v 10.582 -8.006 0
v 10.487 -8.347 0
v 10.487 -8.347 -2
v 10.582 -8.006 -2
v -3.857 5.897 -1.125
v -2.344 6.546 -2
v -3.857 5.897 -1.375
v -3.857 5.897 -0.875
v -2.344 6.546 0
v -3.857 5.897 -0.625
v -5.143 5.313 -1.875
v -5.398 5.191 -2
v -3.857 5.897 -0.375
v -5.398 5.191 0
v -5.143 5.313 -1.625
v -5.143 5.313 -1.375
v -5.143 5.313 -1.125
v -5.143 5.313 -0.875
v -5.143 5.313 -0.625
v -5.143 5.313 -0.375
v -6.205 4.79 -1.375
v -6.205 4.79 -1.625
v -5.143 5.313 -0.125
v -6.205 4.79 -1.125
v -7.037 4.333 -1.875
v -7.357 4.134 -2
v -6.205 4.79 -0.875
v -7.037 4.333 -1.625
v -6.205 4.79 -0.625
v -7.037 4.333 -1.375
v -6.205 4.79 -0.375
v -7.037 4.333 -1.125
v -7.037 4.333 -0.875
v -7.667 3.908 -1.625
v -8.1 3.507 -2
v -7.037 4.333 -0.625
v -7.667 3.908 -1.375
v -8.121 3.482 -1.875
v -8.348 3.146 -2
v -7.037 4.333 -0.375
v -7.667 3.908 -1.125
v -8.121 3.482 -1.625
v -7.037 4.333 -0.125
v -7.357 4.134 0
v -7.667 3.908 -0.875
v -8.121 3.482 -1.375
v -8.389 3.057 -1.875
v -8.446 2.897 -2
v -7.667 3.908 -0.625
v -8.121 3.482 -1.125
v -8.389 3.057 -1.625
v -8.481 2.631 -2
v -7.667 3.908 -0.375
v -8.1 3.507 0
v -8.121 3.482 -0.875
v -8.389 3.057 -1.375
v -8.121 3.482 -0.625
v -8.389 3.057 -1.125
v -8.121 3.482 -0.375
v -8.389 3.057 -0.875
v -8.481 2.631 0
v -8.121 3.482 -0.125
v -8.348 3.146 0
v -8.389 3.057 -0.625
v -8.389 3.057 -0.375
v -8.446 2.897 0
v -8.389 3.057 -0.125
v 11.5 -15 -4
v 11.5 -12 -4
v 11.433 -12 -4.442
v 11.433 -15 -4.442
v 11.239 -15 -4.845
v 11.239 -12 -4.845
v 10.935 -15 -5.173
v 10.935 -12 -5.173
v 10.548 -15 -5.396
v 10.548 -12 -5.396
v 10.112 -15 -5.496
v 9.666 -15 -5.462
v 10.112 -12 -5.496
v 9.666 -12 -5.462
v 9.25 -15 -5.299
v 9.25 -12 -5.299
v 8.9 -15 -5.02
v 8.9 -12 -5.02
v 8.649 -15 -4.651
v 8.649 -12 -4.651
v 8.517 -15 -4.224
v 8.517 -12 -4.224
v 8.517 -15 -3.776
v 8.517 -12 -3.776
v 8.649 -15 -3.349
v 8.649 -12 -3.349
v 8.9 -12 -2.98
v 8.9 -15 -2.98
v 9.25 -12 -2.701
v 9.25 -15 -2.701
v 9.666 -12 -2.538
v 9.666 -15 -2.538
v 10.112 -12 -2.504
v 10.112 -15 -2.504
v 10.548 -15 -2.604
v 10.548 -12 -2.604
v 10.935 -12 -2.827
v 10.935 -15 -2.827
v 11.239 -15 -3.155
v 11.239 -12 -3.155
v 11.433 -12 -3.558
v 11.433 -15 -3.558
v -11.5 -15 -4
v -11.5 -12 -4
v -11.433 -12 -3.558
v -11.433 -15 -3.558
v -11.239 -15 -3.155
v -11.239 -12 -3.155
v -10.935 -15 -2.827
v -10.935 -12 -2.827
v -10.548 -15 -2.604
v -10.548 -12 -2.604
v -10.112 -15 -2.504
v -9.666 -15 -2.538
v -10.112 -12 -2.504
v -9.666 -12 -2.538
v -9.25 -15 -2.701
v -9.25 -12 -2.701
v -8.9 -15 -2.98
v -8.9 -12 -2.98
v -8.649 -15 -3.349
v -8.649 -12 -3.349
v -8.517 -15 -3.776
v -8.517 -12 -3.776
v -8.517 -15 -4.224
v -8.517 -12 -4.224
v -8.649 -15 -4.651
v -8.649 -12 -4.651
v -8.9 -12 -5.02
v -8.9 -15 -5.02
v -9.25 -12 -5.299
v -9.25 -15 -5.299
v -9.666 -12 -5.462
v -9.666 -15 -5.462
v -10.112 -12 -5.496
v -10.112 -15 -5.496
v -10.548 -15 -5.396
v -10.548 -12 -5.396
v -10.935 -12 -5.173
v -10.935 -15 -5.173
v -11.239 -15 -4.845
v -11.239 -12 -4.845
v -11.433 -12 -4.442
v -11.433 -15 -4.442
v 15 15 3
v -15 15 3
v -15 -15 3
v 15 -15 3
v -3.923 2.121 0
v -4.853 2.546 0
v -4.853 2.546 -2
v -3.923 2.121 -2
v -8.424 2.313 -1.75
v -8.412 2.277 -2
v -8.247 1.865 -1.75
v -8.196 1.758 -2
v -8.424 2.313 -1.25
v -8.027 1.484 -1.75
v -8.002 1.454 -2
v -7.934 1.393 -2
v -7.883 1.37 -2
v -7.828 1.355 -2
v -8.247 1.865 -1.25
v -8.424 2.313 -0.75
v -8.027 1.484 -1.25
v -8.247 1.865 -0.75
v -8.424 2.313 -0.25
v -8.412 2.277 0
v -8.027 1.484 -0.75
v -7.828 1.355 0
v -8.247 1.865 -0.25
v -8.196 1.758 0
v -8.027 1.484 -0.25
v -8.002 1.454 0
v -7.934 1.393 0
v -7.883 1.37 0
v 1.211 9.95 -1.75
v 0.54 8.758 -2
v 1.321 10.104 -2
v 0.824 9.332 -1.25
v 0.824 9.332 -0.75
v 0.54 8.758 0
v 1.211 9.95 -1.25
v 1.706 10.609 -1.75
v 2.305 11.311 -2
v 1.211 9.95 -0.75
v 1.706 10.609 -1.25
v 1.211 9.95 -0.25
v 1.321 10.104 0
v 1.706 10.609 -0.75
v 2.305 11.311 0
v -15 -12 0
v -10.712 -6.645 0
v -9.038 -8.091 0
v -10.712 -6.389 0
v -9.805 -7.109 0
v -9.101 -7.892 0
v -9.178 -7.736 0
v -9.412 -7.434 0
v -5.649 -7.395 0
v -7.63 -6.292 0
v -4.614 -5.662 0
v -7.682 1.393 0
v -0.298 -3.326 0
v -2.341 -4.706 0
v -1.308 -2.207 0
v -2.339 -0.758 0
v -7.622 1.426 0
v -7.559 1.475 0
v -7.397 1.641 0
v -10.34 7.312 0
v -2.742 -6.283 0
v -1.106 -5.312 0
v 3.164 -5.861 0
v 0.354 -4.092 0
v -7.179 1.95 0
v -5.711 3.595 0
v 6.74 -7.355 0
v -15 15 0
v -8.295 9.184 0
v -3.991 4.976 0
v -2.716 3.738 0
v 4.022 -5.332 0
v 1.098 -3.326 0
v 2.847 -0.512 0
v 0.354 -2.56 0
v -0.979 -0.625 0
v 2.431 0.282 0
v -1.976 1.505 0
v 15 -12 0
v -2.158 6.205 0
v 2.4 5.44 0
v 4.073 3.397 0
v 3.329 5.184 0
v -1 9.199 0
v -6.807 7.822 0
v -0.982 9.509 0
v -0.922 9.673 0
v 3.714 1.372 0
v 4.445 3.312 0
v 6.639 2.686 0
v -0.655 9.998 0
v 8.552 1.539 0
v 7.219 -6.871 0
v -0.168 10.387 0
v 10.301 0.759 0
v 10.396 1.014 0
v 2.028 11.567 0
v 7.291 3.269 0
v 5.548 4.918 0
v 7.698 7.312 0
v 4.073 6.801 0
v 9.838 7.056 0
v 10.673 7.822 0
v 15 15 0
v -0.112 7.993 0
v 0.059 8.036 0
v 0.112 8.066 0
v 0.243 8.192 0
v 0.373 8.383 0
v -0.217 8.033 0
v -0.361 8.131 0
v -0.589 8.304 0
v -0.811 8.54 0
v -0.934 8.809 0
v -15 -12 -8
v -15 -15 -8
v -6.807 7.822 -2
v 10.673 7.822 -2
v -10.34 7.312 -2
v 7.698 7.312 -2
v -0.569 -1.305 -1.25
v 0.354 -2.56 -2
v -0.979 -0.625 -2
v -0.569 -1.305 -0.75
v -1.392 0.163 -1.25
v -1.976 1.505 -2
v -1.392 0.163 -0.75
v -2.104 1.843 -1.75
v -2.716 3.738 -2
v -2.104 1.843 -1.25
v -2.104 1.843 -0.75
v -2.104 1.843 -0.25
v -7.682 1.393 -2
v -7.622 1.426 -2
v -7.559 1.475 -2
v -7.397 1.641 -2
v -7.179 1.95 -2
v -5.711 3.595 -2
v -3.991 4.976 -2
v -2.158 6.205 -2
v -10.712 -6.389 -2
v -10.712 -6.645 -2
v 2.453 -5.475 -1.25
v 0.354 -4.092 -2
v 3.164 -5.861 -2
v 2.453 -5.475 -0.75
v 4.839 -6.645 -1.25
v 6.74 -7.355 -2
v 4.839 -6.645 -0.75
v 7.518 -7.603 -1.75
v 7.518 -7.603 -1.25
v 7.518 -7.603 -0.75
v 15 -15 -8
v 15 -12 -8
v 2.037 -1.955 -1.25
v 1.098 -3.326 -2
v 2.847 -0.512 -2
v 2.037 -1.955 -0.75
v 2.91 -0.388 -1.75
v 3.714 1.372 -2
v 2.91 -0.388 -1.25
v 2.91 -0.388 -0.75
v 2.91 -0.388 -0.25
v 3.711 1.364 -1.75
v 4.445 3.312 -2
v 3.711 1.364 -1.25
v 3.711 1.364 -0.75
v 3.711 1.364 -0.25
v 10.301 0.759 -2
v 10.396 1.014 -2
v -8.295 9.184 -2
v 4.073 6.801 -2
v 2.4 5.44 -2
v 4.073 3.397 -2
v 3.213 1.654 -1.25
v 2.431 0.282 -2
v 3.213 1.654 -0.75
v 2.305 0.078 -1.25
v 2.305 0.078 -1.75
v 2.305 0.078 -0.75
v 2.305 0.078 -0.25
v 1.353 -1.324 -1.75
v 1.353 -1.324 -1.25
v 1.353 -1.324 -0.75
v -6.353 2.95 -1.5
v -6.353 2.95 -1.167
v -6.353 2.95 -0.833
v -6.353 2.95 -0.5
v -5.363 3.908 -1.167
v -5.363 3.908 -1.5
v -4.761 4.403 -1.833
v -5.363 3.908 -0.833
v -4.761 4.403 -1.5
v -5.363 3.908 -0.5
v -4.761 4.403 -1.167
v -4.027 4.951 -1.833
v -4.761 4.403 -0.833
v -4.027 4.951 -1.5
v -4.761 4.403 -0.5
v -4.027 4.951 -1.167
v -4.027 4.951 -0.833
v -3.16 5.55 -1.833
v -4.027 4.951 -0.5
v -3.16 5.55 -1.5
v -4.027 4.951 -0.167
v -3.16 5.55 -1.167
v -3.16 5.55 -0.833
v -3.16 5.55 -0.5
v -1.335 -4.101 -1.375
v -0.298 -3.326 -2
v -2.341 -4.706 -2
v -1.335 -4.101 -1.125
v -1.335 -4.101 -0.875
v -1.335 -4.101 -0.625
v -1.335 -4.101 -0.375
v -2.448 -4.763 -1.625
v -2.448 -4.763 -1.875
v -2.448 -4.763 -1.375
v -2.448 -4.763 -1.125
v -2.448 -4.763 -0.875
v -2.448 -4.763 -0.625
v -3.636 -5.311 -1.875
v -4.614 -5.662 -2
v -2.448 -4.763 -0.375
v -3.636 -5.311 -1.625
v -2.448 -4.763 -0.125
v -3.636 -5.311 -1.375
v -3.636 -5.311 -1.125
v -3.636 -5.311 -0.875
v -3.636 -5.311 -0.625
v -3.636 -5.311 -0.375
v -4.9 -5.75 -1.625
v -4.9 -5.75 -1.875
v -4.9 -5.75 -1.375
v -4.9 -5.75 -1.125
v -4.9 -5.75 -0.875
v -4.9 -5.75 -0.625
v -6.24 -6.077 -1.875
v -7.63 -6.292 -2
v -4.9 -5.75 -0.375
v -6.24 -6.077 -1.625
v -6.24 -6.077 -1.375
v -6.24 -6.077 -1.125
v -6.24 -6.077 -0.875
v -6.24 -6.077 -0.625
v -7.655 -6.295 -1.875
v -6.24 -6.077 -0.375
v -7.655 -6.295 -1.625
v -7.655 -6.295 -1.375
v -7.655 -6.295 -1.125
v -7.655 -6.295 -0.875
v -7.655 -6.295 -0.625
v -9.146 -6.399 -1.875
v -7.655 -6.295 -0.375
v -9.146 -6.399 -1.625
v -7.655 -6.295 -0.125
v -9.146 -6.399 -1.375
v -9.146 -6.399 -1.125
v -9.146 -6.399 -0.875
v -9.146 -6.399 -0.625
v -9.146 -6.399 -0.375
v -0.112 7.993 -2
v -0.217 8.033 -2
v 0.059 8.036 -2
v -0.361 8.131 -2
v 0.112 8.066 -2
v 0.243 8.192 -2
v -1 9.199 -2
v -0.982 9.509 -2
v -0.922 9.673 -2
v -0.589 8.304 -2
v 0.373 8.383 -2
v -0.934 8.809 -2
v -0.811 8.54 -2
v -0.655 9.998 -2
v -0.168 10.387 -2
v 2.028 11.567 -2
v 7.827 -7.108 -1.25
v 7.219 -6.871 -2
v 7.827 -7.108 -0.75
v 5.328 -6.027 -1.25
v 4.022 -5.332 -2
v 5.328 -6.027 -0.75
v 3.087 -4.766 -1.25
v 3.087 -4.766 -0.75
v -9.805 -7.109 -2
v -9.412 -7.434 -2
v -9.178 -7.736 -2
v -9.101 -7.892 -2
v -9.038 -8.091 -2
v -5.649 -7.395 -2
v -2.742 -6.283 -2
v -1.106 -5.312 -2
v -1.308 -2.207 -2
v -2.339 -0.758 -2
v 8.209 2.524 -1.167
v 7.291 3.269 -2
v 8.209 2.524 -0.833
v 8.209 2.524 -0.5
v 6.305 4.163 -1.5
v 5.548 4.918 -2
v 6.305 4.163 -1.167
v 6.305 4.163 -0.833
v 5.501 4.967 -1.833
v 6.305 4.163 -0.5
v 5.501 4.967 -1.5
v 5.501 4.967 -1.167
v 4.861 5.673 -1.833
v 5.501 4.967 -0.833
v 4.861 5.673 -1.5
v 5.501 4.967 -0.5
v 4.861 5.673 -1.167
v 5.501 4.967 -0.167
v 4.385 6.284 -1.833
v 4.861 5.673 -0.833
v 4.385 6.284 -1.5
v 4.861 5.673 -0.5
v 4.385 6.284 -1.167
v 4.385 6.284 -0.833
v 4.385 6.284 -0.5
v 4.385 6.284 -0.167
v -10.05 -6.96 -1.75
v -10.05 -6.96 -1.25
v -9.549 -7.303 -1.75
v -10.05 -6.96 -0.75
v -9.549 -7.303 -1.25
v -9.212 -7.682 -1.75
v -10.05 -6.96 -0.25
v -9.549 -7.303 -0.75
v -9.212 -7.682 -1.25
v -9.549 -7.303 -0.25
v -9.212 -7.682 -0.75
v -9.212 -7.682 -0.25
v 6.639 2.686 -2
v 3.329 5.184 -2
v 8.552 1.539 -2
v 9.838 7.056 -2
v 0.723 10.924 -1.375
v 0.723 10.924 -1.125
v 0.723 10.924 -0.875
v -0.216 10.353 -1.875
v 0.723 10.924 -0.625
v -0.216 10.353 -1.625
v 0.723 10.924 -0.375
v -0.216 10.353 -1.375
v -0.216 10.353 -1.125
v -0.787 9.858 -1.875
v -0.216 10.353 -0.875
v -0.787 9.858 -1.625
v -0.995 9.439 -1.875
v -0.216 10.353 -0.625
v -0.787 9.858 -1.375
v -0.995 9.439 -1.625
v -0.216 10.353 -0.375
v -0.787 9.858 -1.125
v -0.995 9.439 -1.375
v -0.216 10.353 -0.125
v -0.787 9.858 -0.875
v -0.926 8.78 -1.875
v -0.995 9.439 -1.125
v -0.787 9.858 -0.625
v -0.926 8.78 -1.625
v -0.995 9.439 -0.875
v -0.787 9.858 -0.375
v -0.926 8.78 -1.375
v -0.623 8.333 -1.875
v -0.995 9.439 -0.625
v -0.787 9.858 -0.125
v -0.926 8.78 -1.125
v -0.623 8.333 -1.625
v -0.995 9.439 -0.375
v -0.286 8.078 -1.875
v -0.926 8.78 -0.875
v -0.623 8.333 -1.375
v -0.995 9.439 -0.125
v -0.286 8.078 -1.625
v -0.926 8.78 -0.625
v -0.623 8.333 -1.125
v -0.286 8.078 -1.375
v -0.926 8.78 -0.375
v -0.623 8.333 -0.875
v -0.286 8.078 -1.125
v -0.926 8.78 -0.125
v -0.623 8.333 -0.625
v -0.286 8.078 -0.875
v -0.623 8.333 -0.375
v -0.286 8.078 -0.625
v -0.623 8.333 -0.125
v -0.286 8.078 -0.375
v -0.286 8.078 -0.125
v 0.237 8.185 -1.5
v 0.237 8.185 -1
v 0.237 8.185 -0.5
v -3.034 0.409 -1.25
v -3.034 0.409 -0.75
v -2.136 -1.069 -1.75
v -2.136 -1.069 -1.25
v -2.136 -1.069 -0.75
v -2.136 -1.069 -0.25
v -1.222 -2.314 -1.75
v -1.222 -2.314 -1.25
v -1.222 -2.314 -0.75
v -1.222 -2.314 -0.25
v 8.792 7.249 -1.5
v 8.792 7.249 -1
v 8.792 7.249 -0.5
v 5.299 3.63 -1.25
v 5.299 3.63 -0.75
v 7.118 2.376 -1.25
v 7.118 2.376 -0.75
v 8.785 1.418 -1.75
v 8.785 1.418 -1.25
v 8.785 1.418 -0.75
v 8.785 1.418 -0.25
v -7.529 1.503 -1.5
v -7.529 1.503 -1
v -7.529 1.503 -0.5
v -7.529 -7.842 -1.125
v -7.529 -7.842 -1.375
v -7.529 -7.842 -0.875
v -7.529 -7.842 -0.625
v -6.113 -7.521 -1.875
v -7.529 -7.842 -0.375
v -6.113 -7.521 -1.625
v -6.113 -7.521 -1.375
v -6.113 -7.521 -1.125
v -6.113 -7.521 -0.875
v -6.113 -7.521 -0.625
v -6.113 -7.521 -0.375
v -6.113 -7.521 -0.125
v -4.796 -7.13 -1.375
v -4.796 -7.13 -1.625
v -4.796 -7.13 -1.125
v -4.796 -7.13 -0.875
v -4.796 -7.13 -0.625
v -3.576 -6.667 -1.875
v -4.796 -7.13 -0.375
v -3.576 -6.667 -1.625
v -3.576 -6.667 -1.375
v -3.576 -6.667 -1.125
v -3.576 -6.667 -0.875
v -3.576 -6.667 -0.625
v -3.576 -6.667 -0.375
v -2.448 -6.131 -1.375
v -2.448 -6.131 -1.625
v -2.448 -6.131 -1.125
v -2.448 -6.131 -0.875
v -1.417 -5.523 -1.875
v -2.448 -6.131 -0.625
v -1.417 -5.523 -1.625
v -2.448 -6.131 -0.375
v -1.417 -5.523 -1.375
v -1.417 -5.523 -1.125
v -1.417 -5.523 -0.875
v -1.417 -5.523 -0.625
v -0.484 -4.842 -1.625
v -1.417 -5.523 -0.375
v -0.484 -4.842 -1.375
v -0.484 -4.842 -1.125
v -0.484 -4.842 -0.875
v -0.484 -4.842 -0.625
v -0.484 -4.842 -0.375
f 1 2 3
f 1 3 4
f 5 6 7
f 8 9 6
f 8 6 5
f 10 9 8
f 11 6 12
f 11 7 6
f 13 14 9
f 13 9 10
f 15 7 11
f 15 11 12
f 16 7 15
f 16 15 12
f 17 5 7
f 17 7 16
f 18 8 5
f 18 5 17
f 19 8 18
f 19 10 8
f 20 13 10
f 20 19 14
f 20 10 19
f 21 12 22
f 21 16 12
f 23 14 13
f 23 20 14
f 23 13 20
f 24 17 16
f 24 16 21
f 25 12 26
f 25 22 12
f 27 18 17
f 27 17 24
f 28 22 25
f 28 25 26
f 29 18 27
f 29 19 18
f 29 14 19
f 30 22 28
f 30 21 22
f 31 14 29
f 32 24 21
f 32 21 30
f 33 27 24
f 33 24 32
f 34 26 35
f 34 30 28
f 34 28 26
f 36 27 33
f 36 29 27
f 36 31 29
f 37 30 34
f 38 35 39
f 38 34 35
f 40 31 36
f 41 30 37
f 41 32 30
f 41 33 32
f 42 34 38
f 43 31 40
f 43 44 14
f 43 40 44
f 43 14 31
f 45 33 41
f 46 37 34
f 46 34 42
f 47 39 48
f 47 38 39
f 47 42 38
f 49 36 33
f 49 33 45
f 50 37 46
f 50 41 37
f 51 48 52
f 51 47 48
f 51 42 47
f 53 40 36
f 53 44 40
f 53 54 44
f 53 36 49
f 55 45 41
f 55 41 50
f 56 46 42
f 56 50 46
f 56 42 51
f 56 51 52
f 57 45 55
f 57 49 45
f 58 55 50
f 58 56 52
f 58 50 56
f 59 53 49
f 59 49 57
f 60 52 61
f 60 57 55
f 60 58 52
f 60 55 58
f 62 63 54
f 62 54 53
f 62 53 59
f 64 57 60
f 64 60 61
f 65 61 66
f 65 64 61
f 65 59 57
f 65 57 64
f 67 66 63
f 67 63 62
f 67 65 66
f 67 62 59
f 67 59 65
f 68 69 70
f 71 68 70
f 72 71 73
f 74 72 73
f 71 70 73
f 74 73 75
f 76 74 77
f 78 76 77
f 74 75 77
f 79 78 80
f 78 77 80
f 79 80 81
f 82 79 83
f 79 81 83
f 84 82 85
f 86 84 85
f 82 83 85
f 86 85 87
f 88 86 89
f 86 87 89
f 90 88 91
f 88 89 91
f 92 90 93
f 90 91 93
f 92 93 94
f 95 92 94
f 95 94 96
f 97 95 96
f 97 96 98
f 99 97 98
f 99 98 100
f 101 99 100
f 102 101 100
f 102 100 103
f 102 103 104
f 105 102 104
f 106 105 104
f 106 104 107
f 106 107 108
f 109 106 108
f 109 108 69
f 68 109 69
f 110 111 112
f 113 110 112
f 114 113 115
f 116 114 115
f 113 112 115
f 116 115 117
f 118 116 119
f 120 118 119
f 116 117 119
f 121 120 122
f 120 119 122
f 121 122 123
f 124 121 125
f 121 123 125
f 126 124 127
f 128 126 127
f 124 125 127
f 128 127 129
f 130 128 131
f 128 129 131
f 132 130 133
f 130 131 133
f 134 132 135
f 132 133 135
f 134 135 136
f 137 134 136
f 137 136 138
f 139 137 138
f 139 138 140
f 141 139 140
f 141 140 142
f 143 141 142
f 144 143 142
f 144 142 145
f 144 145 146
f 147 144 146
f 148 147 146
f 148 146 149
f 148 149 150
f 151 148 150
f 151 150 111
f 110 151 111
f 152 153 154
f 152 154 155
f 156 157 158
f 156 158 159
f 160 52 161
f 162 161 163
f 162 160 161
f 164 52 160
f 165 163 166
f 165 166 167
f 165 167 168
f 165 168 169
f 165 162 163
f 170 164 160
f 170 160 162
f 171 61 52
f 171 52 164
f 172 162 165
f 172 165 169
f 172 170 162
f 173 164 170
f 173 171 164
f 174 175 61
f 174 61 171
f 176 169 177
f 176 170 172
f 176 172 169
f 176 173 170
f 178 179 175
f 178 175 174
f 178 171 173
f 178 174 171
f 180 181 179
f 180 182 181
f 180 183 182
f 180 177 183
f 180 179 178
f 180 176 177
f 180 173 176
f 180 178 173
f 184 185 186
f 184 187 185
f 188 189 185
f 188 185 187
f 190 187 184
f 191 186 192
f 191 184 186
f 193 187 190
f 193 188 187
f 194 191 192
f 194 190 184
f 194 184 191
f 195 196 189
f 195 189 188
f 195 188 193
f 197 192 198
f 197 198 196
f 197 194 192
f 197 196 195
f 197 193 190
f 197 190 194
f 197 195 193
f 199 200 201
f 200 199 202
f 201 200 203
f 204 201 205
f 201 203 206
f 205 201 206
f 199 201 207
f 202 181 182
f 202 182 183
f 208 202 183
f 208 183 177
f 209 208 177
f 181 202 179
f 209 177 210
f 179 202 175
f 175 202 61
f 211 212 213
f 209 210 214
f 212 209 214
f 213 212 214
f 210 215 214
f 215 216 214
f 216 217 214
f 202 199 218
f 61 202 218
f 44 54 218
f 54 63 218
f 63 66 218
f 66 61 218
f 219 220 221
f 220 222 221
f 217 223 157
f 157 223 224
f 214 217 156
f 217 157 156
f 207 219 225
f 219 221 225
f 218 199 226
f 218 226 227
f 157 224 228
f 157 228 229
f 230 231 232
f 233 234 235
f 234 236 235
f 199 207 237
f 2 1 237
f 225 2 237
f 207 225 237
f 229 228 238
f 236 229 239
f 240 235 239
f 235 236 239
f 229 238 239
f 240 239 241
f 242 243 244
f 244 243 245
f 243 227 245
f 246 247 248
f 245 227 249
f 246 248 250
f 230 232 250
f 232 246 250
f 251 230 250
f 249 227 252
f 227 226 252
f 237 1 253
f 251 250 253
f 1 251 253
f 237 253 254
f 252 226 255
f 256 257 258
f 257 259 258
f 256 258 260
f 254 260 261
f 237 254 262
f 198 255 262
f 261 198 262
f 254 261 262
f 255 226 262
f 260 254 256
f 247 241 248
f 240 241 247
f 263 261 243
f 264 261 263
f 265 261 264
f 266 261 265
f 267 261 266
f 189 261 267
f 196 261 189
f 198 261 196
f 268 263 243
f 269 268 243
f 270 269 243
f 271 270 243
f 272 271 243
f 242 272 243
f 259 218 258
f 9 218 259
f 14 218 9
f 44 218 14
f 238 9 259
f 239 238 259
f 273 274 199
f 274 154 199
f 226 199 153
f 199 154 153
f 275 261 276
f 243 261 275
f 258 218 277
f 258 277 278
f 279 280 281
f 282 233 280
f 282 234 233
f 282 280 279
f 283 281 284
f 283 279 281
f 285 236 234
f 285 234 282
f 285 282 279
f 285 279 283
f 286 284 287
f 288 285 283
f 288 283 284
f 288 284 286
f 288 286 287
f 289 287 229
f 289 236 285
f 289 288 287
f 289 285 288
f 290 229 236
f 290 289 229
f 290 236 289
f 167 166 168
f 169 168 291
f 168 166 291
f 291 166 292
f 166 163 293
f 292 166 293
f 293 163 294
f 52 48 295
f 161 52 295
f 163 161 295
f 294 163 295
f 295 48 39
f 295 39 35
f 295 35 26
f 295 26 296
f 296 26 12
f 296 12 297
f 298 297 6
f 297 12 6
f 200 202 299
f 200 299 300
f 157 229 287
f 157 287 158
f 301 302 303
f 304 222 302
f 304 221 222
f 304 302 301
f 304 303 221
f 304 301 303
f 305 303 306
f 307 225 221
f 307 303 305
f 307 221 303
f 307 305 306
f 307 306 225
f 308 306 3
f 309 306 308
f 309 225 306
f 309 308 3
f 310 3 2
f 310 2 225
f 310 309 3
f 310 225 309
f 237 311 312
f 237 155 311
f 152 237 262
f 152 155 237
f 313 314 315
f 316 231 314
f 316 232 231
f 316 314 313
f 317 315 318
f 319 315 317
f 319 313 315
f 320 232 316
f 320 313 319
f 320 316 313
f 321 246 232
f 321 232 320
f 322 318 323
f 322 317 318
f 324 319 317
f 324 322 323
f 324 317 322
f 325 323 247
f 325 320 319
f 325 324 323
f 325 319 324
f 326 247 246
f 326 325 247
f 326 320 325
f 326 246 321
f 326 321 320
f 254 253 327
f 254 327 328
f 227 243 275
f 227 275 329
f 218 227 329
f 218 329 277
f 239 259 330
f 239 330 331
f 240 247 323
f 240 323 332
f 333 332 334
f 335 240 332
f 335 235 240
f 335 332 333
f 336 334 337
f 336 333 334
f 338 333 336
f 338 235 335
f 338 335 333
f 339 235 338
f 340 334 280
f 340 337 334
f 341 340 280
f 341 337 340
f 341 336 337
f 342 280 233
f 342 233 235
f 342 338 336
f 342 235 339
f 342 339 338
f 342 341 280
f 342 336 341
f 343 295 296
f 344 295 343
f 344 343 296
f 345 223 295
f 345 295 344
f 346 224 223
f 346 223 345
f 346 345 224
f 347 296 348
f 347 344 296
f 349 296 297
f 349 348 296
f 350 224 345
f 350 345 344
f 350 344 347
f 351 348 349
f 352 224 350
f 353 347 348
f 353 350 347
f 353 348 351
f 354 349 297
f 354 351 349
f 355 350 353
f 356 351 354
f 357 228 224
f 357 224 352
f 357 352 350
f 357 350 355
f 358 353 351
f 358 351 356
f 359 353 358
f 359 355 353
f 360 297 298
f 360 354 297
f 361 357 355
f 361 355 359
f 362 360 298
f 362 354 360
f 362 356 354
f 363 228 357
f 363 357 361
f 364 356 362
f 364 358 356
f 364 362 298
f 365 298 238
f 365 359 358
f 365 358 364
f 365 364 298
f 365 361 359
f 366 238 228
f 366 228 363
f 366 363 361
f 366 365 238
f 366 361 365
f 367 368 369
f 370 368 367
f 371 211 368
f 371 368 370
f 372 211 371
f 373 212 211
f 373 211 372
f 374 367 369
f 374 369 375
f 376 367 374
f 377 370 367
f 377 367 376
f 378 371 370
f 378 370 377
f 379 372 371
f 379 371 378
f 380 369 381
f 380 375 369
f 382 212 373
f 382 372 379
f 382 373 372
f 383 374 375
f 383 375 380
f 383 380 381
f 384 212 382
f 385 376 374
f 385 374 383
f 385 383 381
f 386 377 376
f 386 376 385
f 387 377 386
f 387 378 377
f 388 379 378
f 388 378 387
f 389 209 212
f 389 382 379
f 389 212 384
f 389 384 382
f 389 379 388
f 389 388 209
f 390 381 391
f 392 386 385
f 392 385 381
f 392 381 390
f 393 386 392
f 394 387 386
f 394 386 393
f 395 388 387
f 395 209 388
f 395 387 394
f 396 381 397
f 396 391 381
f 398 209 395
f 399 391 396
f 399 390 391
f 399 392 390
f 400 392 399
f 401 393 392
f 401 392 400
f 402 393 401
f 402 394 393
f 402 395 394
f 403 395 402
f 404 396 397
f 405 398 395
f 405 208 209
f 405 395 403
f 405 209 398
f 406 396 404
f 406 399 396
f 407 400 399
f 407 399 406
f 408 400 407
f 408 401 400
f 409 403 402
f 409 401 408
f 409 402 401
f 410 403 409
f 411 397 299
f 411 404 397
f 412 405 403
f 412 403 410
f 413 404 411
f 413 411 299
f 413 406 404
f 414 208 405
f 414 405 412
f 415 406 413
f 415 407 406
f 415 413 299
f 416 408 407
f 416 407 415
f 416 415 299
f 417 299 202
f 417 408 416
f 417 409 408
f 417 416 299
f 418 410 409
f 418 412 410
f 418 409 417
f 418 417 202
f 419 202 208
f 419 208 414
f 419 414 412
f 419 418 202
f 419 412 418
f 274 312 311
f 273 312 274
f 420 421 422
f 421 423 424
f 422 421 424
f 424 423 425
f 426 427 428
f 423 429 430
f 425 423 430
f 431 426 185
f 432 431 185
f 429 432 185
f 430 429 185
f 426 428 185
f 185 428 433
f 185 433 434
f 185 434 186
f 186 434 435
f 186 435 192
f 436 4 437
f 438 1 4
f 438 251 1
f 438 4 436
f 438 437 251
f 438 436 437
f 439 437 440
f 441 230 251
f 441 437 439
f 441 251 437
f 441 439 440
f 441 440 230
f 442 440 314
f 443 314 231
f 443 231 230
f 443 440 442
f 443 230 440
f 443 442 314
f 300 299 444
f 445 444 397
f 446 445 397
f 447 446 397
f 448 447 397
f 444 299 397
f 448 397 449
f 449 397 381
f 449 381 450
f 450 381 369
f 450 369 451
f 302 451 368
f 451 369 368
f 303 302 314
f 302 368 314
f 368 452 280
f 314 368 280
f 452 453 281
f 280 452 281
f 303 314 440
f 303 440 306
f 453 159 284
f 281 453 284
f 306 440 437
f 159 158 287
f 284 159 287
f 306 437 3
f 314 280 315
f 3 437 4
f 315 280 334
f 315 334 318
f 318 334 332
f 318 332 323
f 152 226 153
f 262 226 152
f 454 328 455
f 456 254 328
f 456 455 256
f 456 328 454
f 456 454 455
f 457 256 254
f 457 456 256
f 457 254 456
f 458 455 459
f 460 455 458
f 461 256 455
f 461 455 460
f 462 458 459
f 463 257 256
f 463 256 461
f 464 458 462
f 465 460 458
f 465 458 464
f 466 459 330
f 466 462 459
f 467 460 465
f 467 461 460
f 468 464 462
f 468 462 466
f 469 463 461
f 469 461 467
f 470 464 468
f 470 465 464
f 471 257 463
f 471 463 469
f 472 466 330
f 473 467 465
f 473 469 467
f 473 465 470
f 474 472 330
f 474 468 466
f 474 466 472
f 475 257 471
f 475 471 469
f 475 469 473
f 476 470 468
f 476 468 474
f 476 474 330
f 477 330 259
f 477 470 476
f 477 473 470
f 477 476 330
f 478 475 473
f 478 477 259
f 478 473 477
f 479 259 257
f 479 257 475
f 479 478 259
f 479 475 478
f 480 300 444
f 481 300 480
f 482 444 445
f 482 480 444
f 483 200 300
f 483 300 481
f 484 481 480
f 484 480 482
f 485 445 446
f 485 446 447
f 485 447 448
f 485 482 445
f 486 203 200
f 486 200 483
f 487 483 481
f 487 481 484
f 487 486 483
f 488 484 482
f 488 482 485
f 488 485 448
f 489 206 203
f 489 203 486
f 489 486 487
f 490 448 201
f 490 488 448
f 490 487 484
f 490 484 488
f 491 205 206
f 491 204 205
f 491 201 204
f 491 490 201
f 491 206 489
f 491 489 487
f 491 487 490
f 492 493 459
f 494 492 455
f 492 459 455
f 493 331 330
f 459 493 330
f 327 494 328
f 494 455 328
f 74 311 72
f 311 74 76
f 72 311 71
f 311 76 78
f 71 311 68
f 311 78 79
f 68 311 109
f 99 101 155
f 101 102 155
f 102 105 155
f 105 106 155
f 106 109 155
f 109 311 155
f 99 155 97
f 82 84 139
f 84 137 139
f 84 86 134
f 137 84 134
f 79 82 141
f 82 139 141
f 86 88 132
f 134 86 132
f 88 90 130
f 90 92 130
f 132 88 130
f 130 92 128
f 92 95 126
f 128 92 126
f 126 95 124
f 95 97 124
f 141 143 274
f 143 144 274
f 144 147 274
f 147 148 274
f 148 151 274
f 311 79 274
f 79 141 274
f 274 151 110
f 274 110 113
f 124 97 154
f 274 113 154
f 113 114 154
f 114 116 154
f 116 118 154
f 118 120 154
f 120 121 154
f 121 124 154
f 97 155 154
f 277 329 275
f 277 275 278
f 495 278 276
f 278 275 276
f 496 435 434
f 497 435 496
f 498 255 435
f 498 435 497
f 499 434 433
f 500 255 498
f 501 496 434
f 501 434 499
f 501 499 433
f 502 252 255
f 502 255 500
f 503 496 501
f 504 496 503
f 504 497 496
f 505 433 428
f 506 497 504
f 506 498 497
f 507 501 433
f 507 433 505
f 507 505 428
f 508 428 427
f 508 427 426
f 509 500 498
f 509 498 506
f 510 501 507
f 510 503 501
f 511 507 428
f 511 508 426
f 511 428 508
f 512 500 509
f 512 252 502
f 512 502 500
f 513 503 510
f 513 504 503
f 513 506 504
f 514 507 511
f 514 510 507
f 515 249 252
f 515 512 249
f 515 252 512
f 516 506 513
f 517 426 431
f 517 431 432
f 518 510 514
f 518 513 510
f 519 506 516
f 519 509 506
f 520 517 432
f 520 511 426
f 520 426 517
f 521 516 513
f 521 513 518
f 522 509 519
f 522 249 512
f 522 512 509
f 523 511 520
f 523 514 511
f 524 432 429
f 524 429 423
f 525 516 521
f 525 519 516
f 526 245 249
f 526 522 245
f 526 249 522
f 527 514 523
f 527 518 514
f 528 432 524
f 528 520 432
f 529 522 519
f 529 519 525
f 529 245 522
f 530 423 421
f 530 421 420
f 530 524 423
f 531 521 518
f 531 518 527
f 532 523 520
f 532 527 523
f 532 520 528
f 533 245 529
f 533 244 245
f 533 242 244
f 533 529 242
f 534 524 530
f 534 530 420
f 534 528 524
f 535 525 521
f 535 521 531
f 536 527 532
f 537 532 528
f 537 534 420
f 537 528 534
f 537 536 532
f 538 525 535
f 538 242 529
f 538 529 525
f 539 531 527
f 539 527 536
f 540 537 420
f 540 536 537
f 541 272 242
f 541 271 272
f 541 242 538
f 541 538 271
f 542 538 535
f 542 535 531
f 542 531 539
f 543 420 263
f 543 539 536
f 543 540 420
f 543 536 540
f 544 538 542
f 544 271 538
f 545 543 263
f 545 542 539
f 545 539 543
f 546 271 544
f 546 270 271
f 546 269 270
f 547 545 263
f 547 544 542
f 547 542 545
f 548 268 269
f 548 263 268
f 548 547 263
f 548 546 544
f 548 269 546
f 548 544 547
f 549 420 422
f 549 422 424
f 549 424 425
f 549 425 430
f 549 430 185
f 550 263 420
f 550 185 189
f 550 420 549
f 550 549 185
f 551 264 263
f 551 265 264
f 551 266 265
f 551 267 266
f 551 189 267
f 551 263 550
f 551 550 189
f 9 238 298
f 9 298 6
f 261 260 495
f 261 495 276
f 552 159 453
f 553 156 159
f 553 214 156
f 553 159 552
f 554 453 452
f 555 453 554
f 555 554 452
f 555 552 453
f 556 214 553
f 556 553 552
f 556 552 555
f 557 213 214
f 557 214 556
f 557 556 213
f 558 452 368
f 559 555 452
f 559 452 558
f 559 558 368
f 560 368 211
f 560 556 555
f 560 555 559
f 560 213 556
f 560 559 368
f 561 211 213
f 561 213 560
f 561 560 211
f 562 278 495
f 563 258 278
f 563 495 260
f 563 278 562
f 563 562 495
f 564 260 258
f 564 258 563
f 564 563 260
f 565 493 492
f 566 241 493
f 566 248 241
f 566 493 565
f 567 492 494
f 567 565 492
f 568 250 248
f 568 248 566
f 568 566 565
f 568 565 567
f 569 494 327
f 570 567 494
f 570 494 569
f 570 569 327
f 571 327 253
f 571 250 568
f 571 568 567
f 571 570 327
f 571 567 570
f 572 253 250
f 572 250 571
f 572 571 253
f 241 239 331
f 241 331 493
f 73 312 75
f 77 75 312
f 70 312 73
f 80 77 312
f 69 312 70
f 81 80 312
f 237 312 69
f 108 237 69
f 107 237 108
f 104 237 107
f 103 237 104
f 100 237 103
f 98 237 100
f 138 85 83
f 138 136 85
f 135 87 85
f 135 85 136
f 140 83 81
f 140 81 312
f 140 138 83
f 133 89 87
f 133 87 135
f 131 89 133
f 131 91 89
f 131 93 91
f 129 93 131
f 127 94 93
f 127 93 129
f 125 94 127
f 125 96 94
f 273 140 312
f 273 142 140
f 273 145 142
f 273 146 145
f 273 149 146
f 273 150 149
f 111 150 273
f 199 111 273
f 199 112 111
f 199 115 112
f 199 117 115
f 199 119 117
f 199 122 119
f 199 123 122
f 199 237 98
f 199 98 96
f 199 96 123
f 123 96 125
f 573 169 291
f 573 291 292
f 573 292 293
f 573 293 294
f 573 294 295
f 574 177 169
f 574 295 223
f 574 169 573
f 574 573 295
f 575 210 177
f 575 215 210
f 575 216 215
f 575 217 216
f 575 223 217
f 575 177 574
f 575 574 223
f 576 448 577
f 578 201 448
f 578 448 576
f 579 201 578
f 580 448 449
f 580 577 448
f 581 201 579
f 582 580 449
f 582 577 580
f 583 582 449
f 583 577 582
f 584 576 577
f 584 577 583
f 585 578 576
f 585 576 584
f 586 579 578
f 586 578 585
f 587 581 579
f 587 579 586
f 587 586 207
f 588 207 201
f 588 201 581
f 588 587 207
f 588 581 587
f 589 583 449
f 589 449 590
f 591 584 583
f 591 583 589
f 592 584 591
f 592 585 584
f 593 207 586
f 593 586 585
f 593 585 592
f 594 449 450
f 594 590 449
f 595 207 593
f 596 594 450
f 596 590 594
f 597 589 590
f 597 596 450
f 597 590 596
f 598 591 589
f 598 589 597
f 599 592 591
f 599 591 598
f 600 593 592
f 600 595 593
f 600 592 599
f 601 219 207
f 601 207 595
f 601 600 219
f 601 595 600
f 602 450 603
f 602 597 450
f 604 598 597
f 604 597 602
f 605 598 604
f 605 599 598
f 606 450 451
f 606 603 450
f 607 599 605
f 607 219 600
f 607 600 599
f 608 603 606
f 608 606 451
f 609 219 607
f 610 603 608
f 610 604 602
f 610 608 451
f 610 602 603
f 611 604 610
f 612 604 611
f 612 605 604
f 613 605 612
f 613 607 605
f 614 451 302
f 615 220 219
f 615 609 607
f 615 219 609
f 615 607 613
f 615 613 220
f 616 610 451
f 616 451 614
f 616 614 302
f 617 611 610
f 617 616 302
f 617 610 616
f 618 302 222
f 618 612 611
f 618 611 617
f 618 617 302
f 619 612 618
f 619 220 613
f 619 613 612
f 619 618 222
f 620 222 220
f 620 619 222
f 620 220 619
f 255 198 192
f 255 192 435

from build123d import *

# Parameters (mm, degrees)
SKETCH_1_W          = 30
SKETCH_1_H          = 30
EXTRUDE_1_DEPTH     = 3
SKETCH_2_W          = 30
SKETCH_2_H          = 3
EXTRUDE_2_DEPTH     = 8
EXTRUDE_3_DEPTH     = 2
SKETCH_4_R          = 1.5
CUT_EXTRUDE_1_DEPTH = 32.906112399


with BuildPart() as part:
    # 草图1 → 凸台-拉伸1 (new body)
    with BuildSketch(Plane.XY):
        Rectangle(SKETCH_1_W, SKETCH_1_H)
    extrude(amount=EXTRUDE_1_DEPTH)

    # 草图2 → 凸台-拉伸2 (add)
    with BuildSketch(Plane(origin=(0, 0, 0), x_dir=(-1, 0, 0), z_dir=(0, 0, -1))):
        with Locations((0, -13.5)):
            Rectangle(SKETCH_2_W, SKETCH_2_H)
    extrude(amount=EXTRUDE_2_DEPTH)

    # 草图3 → 凸台-拉伸3 (add)
    with BuildSketch(Plane(origin=(0, 0, 0), x_dir=(-1, 0, 0), z_dir=(0, 0, -1))):
        with BuildLine():
            Line((-2.305106483, 11.311404977), (-2.027743838, 11.566704685))
            add(Edge.make_bspline(
                [(-2.027743838, 11.566704685), (-1.794878972, 11.457790237), (-1.355574197, 11.252320696), (-0.747856089, 10.942285903), (-0.229982958, 10.649795688), (0.194428064, 10.374755127), (0.533566886, 10.121882158), (0.77438392, 9.881751463), (0.944974603, 9.664968691), (1.015639241, 9.391415806), (0.9966854, 9.097589735), (0.941039457, 8.786331398), (0.817795551, 8.5236158), (0.633519261, 8.332982487), (0.449181288, 8.195889891), (0.302760924, 8.088135642), (0.197092176, 8.017364927), (0.134764911, 7.999081008), (0.112361118, 7.992508778)],
                knots=[0, 0, 0, 0, 2.197927662, 4.146439677, 5.832238005, 7.279845715, 8.471106398, 9.436605479, 10.191661816, 10.788881907, 11.804124267, 12.685011878, 13.484502328, 14.241053406, 14.92571184, 15.446805523, 15.80115196, 16, 16, 16, 16], degree=3))
            add(Edge.make_bspline(
                [(0.112361118, 7.992508778), (0.050011554, 8.002947143), (-0.08737732, 8.02594835), (-0.259956516, 8.196857468), (-0.416014276, 8.442101169), (-0.49556336, 8.644926258), (-0.540071468, 8.758407901)],
                knots=[0, 0, 0, 0, 0.700838763, 1.544316304, 2.626032788, 4, 4, 4, 4], degree=3))
            add(Edge.make_bspline(
                [(-0.540071468, 8.758407901), (-0.5821962, 8.852359749), (-0.669510424, 9.047098852), (-0.824057914, 9.340433436), (-1.009761281, 9.641406724), (-1.212425661, 9.95948938), (-1.451127048, 10.280678596), (-1.709872913, 10.617383427), (-1.996269827, 10.962872749), (-2.200425668, 11.193269267), (-2.305106483, 11.311404977)],
                knots=[0, 0, 0, 0, 0.792668784, 1.643007677, 2.550308334, 3.515107773, 4.545787362, 5.629874198, 6.784719067, 8, 8, 8, 8], degree=3))
        make_face()
        with BuildLine():
            Line((-10.673263566, 7.822308973), (6.806886784, 7.822308973))
            Line((6.806886784, 7.822308973), (8.294559155, 9.183907414))
            Line((8.294559155, 9.183907414), (10.340108664, 7.311709558))
            Line((10.340108664, 7.311709558), (-7.697918825, 7.311709558))
            add(Edge.make_bspline(
                [(-7.697918825, 7.311709558), (-7.881871988, 7.308656331), (-8.247237029, 7.302592056), (-8.789546429, 7.25479995), (-9.319932334, 7.173180033), (-9.666114906, 7.095155579), (-9.838023782, 7.056409851)],
                knots=[0, 0, 0, 0, 1.02169224, 2.029269967, 3.021366146, 4, 4, 4, 4], degree=3))
            Line((-9.838023782, 7.056409851), (-10.673263566, 7.822308973))
        make_face()
        with BuildLine():
            Line((-4.073293347, 6.801110143), (-2.399661931, 5.439511702))
            Line((-2.399661931, 5.439511702), (-3.329457162, 5.184211995))
            add(Edge.make_bspline(
                [(-3.329457162, 5.184211995), (-3.661918376, 4.911100535), (-4.308266223, 4.38013633), (-5.275377087, 3.641671086), (-6.20188694, 2.972304041), (-7.094304982, 2.384361746), (-7.944987667, 1.862571734), (-8.76101121, 1.42223379), (-9.537567982, 1.049381648), (-10.053055168, 0.85340936), (-10.301345473, 0.759017063)],
                knots=[0, 0, 0, 0, 1.244563663, 2.419593658, 3.519436122, 4.550355101, 5.510468856, 6.405273195, 7.231881577, 8, 8, 8, 8], degree=3))
            Line((-10.301345473, 0.759017063), (-10.39590092, 1.014316771))
            add(Edge.make_bspline(
                [(-10.39590092, 1.014316771), (-10.017360387, 1.257610495), (-9.271761863, 1.736817941), (-8.210938681, 2.507364265), (-7.222105067, 3.311601244), (-6.458376899, 4.010201777), (-5.891338542, 4.563771343), (-5.510356994, 4.954154228), (-5.169522327, 5.319561824), (-4.868268622, 5.659752471), (-4.609963017, 5.977639283), (-4.390692723, 6.270958293), (-4.211876273, 6.540564482), (-4.117256895, 6.718455576), (-4.073293347, 6.801110143)],
                knots=[0, 0, 0, 0, 1.874567547, 3.692272479, 5.459531722, 7.182386108, 8.002686949, 8.761086549, 9.454870534, 10.08449878, 10.653979193, 11.160886839, 11.610118005, 12, 12, 12, 12], degree=3))
        make_face()
        with BuildLine():
            Line((2.157910627, 6.205410825), (2.343869674, 6.545810435))
            add(Edge.make_bspline(
                [(2.343869674, 6.545810435), (2.605834901, 6.436341272), (3.112201517, 6.224742464), (3.838791155, 5.904957081), (4.5109758, 5.606334574), (5.126868337, 5.32410298), (5.683835605, 5.050933425), (6.18816715, 4.801822938), (6.633579267, 4.564873458), (7.024336582, 4.343514345), (7.367605722, 4.13296053), (7.659729552, 3.917895038), (7.913118437, 3.70773837), (8.117652642, 3.493912706), (8.281765506, 3.281612264), (8.390719488, 3.064564894), (8.468546645, 2.849731388), (8.476569277, 2.703294503), (8.480518201, 2.631214919)],
                knots=[0, 0, 0, 0, 1.812650006, 3.50376826, 5.068178675, 6.508778607, 7.828769435, 9.028683626, 10.099947299, 11.049250256, 11.896072215, 12.668859108, 13.363683509, 13.994673249, 14.555440601, 15.068439001, 15.541464367, 16, 16, 16, 16], degree=3))
            add(Edge.make_bspline(
                [(8.480518201, 2.631214919), (8.476404976, 2.582724581), (8.467267846, 2.475007981), (8.423484243, 2.297731425), (8.344229944, 2.09247344), (8.25102173, 1.867292552), (8.147973226, 1.655779591), (8.0404517, 1.495783125), (7.940944184, 1.382250748), (7.860971901, 1.362739725), (7.828085615, 1.354716381)],
                knots=[0, 0, 0, 0, 0.783511922, 1.740496043, 2.929679364, 4.326021141, 5.673987734, 6.697847245, 7.464527372, 8, 8, 8, 8], degree=3))
            add(Edge.make_bspline(
                [(7.828085615, 1.354716381), (7.778254634, 1.363823494), (7.665304798, 1.384466213), (7.508869781, 1.514426132), (7.33907668, 1.700823102), (7.236160537, 1.861095257), (7.178804877, 1.950415698)],
                knots=[0, 0, 0, 0, 0.659298193, 1.494404119, 2.603619392, 4, 4, 4, 4], degree=3))
            add(Edge.make_bspline(
                [(7.178804877, 1.950415698), (7.05077175, 2.120334623), (6.790528866, 2.465715476), (6.351980668, 2.957201814), (5.879949473, 3.445544273), (5.448204004, 3.838103862), (5.071308787, 4.156382587), (4.753669197, 4.410381652), (4.40326017, 4.679131769), (4.018624623, 4.958216125), (3.602200666, 5.252417066), (3.150171333, 5.557368175), (2.666341418, 5.878628105), (2.330498068, 6.094484039), (2.157910627, 6.205410825)],
                knots=[0, 0, 0, 0, 1.156150992, 2.350017333, 3.577869138, 4.847260874, 5.520054583, 6.25951119, 7.058018181, 7.920529522, 8.842772332, 9.829688202, 10.884692641, 12, 12, 12, 12], degree=3))
        make_face()
        with BuildLine():
            Line((4.852740874, 2.546115016), (3.922945643, 2.120615504))
            add(Edge.make_bspline(
                [(3.922945643, 2.120615504), (3.778143809, 1.82421938), (3.495891085, 1.246473844), (3.04537482, 0.421735242), (2.600207435, -0.348814984), (2.14910532, -1.060375348), (1.693094833, -1.712036898), (1.235082828, -2.306624664), (0.778013133, -2.84595086), (0.454910586, -3.169143954), (0.298320165, -3.325778259)],
                knots=[0, 0, 0, 0, 1.204096835, 2.347067039, 3.429841553, 4.452343735, 5.421672099, 6.332275, 7.191743416, 8, 8, 8, 8], degree=3))
            add(Edge.make_bspline(
                [(0.298320165, -3.325778259), (0.467371652, -3.460680933), (0.804829073, -3.729971132), (1.331492998, -4.10738687), (1.88197699, -4.447975474), (2.445743055, -4.770543562), (3.033662777, -5.053897321), (3.636746234, -5.318574444), (4.26028991, -5.550228819), (4.903129981, -5.75541281), (5.562944375, -5.935964084), (6.244219172, -6.082699716), (6.942165498, -6.206022022), (7.660409719, -6.300592633), (8.396506838, -6.36624034), (9.152451449, -6.40361966), (9.926304872, -6.414121821), (10.448350425, -6.397679491), (10.712026756, -6.38937475)],
                knots=[0, 0, 0, 0, 0.934343793, 1.865119626, 2.797078927, 3.729977298, 4.669861379, 5.615133413, 6.574575313, 7.542078903, 8.529761733, 9.528696818, 10.55179032, 11.591106972, 12.657506233, 13.743698561, 14.860380514, 16, 16, 16, 16], degree=3))
            Line((10.712026756, -6.38937475), (10.712026756, -6.644674457))
            add(Edge.make_bspline(
                [(10.712026756, -6.644674457), (10.593551143, -6.694413754), (10.368009945, -6.789102106), (10.057143895, -6.952034998), (9.783930664, -7.117072932), (9.551528569, -7.293653878), (9.360617359, -7.47996839), (9.209175094, -7.673945806), (9.097776051, -7.877179087), (9.057887744, -8.021061239), (9.03839534, -8.091372801)],
                knots=[0, 0, 0, 0, 1.342228497, 2.555191034, 3.66432754, 4.674491749, 5.598393505, 6.443878379, 7.239562799, 8, 8, 8, 8], degree=3))
            add(Edge.make_bspline(
                [(9.03839534, -8.091372801), (8.782895007, -8.053774011), (8.278227338, -7.979508381), (7.534842543, -7.847534784), (6.814769096, -7.696310098), (6.119241864, -7.525795044), (5.446927157, -7.340877009), (4.800151359, -7.136303868), (4.178578687, -6.9112148), (3.578469668, -6.672573488), (3.001920816, -6.414512859), (2.449407864, -6.137513581), (1.922822868, -5.839647417), (1.417450221, -5.528897707), (0.937404482, -5.197825017), (0.484023103, -4.846060424), (0.04937862, -4.482669543), (-0.220108602, -4.221530185), (-0.354112421, -4.091677381)],
                knots=[0, 0, 0, 0, 1.193225404, 2.35687475, 3.487949324, 4.592342887, 5.665273416, 6.709260648, 7.725799817, 8.71919469, 9.692664653, 10.643553074, 11.573847077, 12.487217793, 13.384029152, 14.266643611, 15.138080182, 16, 16, 16, 16], degree=3))
            add(Edge.make_bspline(
                [(-0.354112421, -4.091677381), (-0.687954777, -4.336238901), (-1.36469164, -4.831993238), (-2.457220721, -5.491503236), (-3.616311833, -6.105133202), (-4.849137014, -6.663426184), (-6.155501273, -7.164833907), (-7.532331542, -7.620724798), (-8.982918656, -8.017005113), (-9.979873138, -8.235475251), (-10.487304519, -8.346672508)],
                knots=[0, 0, 0, 0, 0.895891654, 1.816075456, 2.760633746, 3.735148952, 4.745060468, 5.78983574, 6.875067292, 8, 8, 8, 8], degree=3))
            Line((-10.487304519, -8.346672508), (-10.581859967, -8.006272898))
            add(Edge.make_bspline(
                [(-10.581859967, -8.006272898), (-10.110834321, -7.868872221), (-9.183269378, -7.598296613), (-7.83804971, -7.122751604), (-6.554032396, -6.606440296), (-5.334681224, -6.042862661), (-4.178464198, -5.435332451), (-3.08902742, -4.779483566), (-2.056181335, -4.088247104), (-1.415110101, -3.578144674), (-1.097948607, -3.325778259)],
                knots=[0, 0, 0, 0, 1.105387851, 2.176779602, 3.213352566, 4.222748287, 5.202262626, 6.154710299, 7.087067382, 8, 8, 8, 8], degree=3))
            add(Edge.make_bspline(
                [(-1.097948607, -3.325778259), (-1.260055043, -3.106837933), (-1.589883827, -2.661372453), (-2.048484783, -1.948011623), (-2.492442326, -1.18834854), (-2.920242442, -0.381785035), (-3.331401412, 0.471478138), (-3.720806012, 1.374691494), (-4.095894147, 2.32503193), (-4.327447855, 2.979277785), (-4.44521144, 3.312014139)],
                knots=[0, 0, 0, 0, 0.875624334, 1.781583235, 2.724691925, 3.703827006, 4.716008585, 5.76891757, 6.865316105, 8, 8, 8, 8], degree=3))
            Line((-4.44521144, 3.312014139), (-4.073293347, 3.397114042))
            add(Edge.make_bspline(
                [(-4.073293347, 3.397114042), (-3.933134319, 3.09897675), (-3.657432916, 2.512522417), (-3.221796476, 1.660810191), (-2.775613682, 0.850452935), (-2.31503743, 0.084755389), (-1.845304898, -0.639422738), (-1.362545341, -1.320629255), (-0.870186722, -1.961636505), (-0.524078683, -2.362851182), (-0.354112421, -2.559879136)],
                knots=[0, 0, 0, 0, 1.121804492, 2.206658228, 3.257157778, 4.27140299, 5.248867787, 6.195889759, 7.114040017, 8, 8, 8, 8], degree=3))
            add(Edge.make_bspline(
                [(-0.354112421, -2.559879136), (-0.192509947, -2.36144819), (0.135702757, -1.958437299), (0.582016589, -1.299215138), (1.007149635, -0.591689341), (1.404711522, 0.170425626), (1.772606892, 0.985808869), (2.115397305, 1.853872388), (2.43500954, 2.774833691), (2.620849746, 3.412007893), (2.715787766, 3.737513652)],
                knots=[0, 0, 0, 0, 0.869716896, 1.76638467, 2.70366274, 3.675080695, 4.68700289, 5.743663211, 6.847331519, 8, 8, 8, 8], degree=3))
            Line((2.715787766, 3.737513652), (4.852740874, 2.546115016))
        make_face()
    extrude(amount=EXTRUDE_3_DEPTH)

    # 草图4 → 切除-拉伸1 (cut, through all)
    with BuildSketch(Plane(origin=(0, -12, 0), x_dir=(1, 0, 0), z_dir=(0, 1, 0))):
        with Locations(Location((-10, 3.999978925, 0), (0, 0, 180))):
            Circle(SKETCH_4_R)
        with Locations((10, 3.999978925)):
            Circle(SKETCH_4_R)
    extrude(amount=-CUT_EXTRUDE_1_DEPTH, mode=Mode.SUBTRACT)


solid = part.part
